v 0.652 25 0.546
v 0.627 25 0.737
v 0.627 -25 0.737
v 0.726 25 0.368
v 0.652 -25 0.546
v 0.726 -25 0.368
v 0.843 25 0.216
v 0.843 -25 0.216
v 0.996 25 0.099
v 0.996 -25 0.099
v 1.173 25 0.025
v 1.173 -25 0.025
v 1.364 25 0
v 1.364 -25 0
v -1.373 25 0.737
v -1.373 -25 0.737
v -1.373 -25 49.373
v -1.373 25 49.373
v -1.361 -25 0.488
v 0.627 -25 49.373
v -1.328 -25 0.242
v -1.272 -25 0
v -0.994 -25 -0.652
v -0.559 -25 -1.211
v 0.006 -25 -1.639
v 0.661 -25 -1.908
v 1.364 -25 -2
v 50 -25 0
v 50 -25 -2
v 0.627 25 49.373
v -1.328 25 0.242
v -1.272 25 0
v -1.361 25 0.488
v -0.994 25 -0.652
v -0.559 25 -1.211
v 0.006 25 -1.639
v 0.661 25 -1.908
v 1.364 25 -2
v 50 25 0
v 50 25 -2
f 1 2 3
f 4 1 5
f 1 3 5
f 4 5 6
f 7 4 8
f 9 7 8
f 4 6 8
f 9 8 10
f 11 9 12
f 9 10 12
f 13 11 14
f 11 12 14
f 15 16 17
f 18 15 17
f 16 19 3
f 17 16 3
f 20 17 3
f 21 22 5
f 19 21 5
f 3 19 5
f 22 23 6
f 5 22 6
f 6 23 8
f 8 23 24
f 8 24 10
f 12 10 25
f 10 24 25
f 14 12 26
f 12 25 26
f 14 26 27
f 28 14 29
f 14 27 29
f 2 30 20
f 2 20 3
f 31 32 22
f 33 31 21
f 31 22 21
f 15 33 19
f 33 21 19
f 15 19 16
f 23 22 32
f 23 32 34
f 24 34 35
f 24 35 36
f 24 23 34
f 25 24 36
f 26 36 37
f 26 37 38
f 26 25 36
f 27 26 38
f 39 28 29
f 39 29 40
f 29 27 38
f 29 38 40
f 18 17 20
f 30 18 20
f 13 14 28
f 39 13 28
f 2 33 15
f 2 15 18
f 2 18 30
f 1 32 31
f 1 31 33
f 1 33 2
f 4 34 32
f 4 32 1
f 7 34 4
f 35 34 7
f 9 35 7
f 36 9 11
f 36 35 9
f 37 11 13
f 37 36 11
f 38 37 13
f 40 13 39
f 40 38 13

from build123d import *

# Parameters (mm, degrees)
SKETCH_1_W             = 100
SKETCH_1_H             = 50
SM_BASE_FLANGE_2_DEPTH = 2
OTHER_START            = -25
OTHER_1_DEPTH          = 50
OTHER_1_2_DEPTH        = 50


# Read off the part's stored shape, not the designer's step: Нарисованный сгиб1
# Sheet-metal steps are written as plain solids
with BuildPart() as part:
    # Эскиз1 → Базовая кромка2 (new body)
    with BuildSketch(Plane.XY):
        Rectangle(SKETCH_1_W, SKETCH_1_H)
    extrude(amount=-SM_BASE_FLANGE_2_DEPTH)

    # Other 1 outline → Other 1 (cut)
    with BuildSketch(Plane(origin=(0, 0, 0), x_dir=(1, 0, 0), z_dir=(0, 1, 0)).offset(OTHER_START)):
        with BuildLine():
            Line((-50, 0), (-1.271679947, 0))
            ThreePointArc((-1.271679947, 0), (-0.290344758, 1.443395312), (1.363922451, 2))
            Line((1.363922451, 2), (-50, 2))
            Line((-50, 2), (-50, 0))
        make_face()
    extrude(amount=OTHER_1_DEPTH, mode=Mode.SUBTRACT)

    # Other 1 2 outline → Other 1 2 (add)
    with BuildSketch(Plane(origin=(0, 0, 0), x_dir=(1, 0, 0), z_dir=(0, 1, 0)).offset(OTHER_START)):
        with BuildLine():
            ThreePointArc((-1.271679947, 0), (-1.347310579, -0.364854094), (-1.372677549, -0.7366))
            Line((-1.372677549, -0.7366), (-1.372677549, -49.372677549))
            Line((-1.372677549, -49.372677549), (0.627322451, -49.372677549))
            Line((0.627322451, -49.372677549), (0.627322451, -0.7366))
            ThreePointArc((0.627322451, -0.7366), (0.843067596, -0.215745145), (1.363922451, 0))
            Line((1.363922451, 0), (-1.271679947, 0))
        make_face()
    extrude(amount=OTHER_1_2_DEPTH)


solid = part.part
